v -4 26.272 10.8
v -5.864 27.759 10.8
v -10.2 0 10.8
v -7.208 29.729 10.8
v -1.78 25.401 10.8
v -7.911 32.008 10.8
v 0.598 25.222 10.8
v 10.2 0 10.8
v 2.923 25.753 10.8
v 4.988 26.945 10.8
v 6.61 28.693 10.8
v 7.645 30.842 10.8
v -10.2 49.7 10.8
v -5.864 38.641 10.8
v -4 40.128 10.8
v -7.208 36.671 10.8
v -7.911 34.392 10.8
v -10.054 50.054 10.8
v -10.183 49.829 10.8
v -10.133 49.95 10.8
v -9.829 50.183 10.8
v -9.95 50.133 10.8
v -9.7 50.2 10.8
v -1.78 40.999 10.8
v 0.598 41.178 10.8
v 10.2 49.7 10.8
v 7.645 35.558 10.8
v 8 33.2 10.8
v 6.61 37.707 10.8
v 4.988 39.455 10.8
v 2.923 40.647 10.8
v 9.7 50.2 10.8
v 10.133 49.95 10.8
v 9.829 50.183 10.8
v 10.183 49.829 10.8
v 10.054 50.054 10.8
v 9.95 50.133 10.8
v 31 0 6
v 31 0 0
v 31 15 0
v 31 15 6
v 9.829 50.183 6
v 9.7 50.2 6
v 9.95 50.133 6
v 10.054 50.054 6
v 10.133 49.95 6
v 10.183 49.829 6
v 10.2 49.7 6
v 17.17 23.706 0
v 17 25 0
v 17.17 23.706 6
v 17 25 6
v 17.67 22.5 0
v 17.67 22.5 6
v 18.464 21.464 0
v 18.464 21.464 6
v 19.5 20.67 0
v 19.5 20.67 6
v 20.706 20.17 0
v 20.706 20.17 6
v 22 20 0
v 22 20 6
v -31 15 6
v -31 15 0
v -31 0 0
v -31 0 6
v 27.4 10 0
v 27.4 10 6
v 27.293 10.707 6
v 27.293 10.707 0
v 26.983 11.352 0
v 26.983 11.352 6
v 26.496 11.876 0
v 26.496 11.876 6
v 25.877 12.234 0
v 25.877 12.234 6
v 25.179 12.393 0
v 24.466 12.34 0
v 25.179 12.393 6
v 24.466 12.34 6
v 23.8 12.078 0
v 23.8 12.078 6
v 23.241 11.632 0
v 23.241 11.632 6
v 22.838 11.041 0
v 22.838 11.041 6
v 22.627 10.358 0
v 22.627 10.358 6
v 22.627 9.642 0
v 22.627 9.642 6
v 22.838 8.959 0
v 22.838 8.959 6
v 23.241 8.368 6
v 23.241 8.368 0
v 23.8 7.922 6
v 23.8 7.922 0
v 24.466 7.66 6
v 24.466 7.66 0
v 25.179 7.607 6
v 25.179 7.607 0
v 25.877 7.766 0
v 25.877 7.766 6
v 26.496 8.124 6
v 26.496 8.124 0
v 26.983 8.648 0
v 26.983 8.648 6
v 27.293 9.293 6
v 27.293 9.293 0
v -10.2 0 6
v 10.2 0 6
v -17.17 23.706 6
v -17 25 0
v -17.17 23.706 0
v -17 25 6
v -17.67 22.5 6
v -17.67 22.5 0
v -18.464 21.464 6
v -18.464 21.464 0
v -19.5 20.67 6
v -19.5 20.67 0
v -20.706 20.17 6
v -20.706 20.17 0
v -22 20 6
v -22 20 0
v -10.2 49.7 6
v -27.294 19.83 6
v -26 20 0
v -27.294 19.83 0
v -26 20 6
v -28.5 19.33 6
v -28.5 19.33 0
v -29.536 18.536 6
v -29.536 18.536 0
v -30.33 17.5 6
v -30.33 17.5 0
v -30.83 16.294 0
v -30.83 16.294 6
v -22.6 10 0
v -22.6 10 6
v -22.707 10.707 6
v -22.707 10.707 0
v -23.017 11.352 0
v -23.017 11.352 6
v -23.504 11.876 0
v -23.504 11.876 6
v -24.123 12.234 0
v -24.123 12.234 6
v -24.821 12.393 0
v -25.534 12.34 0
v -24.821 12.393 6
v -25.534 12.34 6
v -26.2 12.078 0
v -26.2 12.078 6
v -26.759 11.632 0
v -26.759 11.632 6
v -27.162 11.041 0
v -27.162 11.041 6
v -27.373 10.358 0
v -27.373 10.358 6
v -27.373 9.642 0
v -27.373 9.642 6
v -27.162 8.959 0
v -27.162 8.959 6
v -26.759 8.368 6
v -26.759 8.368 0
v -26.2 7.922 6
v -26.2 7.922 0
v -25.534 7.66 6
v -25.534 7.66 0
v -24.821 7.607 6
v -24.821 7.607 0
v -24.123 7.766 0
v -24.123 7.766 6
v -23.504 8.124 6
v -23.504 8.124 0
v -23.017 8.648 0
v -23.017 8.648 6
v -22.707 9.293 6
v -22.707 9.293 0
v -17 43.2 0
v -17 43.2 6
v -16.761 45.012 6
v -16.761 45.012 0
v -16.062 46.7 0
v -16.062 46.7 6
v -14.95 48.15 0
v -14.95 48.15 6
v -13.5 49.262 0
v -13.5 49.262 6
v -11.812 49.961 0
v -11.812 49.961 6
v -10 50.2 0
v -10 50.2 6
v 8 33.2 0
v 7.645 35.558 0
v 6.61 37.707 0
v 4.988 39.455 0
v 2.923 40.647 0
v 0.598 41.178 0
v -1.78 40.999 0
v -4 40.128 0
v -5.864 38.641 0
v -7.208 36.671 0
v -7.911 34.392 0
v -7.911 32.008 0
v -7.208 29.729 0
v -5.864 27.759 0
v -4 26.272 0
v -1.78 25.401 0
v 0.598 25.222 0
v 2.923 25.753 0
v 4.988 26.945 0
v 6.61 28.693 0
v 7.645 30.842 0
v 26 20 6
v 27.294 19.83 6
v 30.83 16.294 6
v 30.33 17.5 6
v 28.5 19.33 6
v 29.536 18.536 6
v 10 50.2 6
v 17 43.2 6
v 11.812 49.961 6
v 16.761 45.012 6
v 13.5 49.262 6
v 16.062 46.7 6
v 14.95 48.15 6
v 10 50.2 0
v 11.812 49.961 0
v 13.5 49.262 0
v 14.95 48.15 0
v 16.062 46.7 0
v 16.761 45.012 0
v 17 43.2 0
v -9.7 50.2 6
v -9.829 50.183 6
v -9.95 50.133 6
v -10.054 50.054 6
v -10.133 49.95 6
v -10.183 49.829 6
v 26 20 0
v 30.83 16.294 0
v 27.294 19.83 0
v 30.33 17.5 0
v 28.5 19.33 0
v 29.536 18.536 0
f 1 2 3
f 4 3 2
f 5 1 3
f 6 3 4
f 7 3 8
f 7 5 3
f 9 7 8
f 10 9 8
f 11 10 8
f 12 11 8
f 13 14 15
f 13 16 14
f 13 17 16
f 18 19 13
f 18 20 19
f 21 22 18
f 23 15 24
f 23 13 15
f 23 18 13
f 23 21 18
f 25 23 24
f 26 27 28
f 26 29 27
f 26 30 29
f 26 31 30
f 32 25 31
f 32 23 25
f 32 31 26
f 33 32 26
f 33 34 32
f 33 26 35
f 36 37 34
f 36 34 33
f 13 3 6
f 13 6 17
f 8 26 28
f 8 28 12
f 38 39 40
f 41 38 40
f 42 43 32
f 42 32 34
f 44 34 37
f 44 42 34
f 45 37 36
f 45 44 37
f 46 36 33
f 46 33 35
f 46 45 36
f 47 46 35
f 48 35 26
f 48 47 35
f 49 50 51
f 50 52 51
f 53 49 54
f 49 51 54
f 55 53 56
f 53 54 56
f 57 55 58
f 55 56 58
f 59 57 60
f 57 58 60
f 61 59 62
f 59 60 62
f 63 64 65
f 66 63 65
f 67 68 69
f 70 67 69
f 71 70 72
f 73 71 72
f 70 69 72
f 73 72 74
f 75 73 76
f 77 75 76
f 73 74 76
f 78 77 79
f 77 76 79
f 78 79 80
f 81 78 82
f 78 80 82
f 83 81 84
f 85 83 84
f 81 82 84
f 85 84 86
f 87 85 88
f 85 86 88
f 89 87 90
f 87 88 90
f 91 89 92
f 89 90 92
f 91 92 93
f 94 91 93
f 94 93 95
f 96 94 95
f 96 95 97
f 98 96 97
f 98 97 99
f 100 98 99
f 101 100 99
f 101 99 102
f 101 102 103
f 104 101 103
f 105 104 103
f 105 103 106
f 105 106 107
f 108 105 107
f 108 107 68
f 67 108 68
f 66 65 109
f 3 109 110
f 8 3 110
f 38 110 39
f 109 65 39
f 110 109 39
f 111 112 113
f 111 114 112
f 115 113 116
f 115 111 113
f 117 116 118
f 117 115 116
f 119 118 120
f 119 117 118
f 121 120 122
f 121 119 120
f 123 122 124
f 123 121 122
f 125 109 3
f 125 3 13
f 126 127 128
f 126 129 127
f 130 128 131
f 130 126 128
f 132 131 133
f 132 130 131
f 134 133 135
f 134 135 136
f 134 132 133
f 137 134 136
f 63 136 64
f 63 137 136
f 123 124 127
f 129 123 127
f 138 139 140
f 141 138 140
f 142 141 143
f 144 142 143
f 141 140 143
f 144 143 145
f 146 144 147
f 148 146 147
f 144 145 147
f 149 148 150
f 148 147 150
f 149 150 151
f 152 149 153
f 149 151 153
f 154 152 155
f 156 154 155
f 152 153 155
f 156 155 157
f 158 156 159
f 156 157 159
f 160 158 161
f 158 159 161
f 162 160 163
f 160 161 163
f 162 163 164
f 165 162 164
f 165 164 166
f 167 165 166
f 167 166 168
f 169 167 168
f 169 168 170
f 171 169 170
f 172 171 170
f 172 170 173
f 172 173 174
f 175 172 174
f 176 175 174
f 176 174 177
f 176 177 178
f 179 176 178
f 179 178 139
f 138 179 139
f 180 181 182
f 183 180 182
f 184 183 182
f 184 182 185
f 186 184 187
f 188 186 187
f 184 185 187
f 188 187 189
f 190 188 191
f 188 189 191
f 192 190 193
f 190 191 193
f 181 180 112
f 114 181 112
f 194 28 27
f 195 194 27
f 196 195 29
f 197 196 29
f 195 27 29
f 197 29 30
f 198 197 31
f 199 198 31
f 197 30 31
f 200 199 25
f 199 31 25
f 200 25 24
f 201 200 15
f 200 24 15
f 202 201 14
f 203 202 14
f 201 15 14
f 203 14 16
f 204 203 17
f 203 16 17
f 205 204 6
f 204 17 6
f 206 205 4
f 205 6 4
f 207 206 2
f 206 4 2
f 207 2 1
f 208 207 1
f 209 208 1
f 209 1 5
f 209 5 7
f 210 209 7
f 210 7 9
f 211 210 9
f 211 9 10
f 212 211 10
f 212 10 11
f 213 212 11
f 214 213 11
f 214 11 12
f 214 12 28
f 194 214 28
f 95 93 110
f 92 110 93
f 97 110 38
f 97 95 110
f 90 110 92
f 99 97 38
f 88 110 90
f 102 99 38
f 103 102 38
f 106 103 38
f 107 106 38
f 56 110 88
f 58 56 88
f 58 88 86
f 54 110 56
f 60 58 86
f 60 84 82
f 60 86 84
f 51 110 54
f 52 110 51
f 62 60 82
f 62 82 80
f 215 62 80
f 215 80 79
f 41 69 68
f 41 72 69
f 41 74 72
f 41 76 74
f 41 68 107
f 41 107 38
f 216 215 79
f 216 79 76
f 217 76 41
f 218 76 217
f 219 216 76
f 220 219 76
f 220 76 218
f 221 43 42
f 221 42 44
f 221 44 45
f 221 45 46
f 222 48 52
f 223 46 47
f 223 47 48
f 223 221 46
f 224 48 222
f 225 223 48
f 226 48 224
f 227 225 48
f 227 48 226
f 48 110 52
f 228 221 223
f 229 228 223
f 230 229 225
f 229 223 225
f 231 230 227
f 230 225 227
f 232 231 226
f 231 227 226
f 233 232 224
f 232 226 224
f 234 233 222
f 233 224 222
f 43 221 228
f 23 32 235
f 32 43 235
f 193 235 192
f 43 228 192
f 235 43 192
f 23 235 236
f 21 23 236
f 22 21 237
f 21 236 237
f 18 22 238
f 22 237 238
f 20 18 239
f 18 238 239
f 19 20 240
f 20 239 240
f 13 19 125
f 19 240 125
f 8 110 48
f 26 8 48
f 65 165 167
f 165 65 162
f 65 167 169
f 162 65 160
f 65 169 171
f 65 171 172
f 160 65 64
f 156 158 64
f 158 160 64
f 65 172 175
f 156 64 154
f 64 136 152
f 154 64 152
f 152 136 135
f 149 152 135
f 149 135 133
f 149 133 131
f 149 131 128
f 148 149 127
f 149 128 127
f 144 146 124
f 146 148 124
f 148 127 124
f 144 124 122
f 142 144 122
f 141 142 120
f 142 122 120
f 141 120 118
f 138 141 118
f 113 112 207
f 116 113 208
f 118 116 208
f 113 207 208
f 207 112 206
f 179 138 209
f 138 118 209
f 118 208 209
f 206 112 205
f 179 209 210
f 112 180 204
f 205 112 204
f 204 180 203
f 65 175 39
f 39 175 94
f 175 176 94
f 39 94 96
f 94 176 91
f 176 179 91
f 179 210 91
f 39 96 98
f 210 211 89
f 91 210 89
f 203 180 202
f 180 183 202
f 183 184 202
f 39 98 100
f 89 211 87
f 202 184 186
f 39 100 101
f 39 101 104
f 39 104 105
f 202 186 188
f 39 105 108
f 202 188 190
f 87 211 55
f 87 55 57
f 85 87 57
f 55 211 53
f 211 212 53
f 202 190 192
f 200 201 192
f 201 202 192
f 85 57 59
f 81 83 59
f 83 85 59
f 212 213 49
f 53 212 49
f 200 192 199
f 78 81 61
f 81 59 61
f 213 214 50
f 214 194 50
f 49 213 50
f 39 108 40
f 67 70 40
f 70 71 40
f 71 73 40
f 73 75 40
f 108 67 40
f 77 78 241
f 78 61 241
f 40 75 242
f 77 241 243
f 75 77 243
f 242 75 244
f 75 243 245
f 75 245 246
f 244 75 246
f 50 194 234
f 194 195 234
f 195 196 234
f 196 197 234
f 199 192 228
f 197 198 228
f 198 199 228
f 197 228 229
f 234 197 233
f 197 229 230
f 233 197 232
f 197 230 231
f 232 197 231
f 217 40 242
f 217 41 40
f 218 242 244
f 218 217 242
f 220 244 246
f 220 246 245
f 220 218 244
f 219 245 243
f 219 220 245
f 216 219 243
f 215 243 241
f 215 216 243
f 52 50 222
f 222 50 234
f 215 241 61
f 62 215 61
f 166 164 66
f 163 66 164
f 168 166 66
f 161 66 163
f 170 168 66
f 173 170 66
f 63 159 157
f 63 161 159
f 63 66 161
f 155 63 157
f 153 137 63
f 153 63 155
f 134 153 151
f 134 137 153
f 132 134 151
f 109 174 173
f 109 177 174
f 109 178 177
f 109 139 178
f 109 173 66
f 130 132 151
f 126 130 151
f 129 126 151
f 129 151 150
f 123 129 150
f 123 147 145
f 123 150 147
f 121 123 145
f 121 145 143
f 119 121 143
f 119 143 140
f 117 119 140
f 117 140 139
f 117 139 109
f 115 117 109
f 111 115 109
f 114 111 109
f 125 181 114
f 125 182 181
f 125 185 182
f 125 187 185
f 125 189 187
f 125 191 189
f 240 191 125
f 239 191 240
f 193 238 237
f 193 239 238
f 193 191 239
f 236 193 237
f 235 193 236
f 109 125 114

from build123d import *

# Parameters (mm, degrees)
F1_DEPTH     = 6
F2_W         = 20.4
F2_H         = 50.2
F3_DEPTH     = 4.8
F4_R         = 8
F5_DEPTH     = 10.801
F6_R         = 2.4
F7_DEPTH     = 6.001
F8_R         = 7
F9_R         = 5
F10_T1_DEPTH = 6.0500204163


# Not quite as in the source:
# - a fillet or chamfer that OpenCascade refuses, or shapes differently, is made with other operations: its cross-section is extruded or revolved along the edge and cut away or added


with BuildPart() as f1:
    # F0 (on Top) → F1 (new body)
    with BuildSketch(Plane.XY):
        Polygon((-31, 20), (-31, 0), (31, 0), (31, 20), (17, 20), (17, 50.2), (-17, 50.2), (-17, 20), align=None)
    extrude(amount=F1_DEPTH)

    # F2 (on face) → F3 (join)
    with BuildSketch(Plane.XY.offset(6)):
        with Locations((0, 25.1)):
            Rectangle(F2_W, F2_H)
    extrude(amount=F3_DEPTH)

    # F4 (on face) → F5 (cut, through all)
    with BuildSketch(Plane.XY.offset(10.8)):
        with Locations((0, 33.2)):
            Circle(F4_R)
    extrude(amount=-F5_DEPTH, mode=Mode.SUBTRACT)

    # F6 (on face) → F7 (cut, through all)
    with BuildSketch(Plane.XY.offset(6)):
        with Locations((-25, 10)):
            Circle(F6_R)
        with Locations((25, 10)):
            Circle(F6_R)
    extrude(amount=-F7_DEPTH, mode=Mode.SUBTRACT)

    # F8
    f8_edges = [f1.edges().sort_by_distance(p)[0] for p in [
        (17, 50.2, 3),
        (-17, 50.2, 3),
    ]]
    fillet(f8_edges, radius=F8_R)

    # F9
    f9_edges = [f1.edges().sort_by_distance(p)[0] for p in [
        (-31, 20, 3),
        (31, 20, 3),
        (17, 20, 3),
        (-17, 20, 3),
    ]]
    fillet(f9_edges, radius=F9_R)

    # F10: fillet of radius 0.5 on 2 edges, made by hand

    # F10_s2 → F10_t1 (cut)
    with BuildSketch(Plane.XY.offset(6)):
        with BuildLine():
            ThreePointArc((9.7, 50.2), (10.0535533906, 50.0535533906), (10.2, 49.7))
            Line((10.2, 49.7), (10.25, 49.7))
            Line((10.25, 49.7), (10.25, 50.1971422738))
            Line((10.25, 50.1971422738), (10.2014285714, 50.2471218615))
            ThreePointArc((10.2014285714, 50.2471218615), (10, 50.25), (9.7, 50.25))
            Line((9.7, 50.25), (9.7, 50.2))
        make_face()
        with BuildLine():
            ThreePointArc((-9.7, 50.2), (-10.0535533906, 50.0535533906), (-10.2, 49.7))
            Line((-10.2, 49.7), (-10.25, 49.7))
            Line((-10.25, 49.7), (-10.25, 50.1971422738))
            Line((-10.25, 50.1971422738), (-10.2014285714, 50.2471218615))
            ThreePointArc((-10.2014285714, 50.2471218615), (-10, 50.25), (-9.7, 50.25))
            Line((-9.7, 50.25), (-9.7, 50.2))
        make_face()
    extrude(amount=F10_T1_DEPTH, mode=Mode.SUBTRACT)


solid = f1.part
